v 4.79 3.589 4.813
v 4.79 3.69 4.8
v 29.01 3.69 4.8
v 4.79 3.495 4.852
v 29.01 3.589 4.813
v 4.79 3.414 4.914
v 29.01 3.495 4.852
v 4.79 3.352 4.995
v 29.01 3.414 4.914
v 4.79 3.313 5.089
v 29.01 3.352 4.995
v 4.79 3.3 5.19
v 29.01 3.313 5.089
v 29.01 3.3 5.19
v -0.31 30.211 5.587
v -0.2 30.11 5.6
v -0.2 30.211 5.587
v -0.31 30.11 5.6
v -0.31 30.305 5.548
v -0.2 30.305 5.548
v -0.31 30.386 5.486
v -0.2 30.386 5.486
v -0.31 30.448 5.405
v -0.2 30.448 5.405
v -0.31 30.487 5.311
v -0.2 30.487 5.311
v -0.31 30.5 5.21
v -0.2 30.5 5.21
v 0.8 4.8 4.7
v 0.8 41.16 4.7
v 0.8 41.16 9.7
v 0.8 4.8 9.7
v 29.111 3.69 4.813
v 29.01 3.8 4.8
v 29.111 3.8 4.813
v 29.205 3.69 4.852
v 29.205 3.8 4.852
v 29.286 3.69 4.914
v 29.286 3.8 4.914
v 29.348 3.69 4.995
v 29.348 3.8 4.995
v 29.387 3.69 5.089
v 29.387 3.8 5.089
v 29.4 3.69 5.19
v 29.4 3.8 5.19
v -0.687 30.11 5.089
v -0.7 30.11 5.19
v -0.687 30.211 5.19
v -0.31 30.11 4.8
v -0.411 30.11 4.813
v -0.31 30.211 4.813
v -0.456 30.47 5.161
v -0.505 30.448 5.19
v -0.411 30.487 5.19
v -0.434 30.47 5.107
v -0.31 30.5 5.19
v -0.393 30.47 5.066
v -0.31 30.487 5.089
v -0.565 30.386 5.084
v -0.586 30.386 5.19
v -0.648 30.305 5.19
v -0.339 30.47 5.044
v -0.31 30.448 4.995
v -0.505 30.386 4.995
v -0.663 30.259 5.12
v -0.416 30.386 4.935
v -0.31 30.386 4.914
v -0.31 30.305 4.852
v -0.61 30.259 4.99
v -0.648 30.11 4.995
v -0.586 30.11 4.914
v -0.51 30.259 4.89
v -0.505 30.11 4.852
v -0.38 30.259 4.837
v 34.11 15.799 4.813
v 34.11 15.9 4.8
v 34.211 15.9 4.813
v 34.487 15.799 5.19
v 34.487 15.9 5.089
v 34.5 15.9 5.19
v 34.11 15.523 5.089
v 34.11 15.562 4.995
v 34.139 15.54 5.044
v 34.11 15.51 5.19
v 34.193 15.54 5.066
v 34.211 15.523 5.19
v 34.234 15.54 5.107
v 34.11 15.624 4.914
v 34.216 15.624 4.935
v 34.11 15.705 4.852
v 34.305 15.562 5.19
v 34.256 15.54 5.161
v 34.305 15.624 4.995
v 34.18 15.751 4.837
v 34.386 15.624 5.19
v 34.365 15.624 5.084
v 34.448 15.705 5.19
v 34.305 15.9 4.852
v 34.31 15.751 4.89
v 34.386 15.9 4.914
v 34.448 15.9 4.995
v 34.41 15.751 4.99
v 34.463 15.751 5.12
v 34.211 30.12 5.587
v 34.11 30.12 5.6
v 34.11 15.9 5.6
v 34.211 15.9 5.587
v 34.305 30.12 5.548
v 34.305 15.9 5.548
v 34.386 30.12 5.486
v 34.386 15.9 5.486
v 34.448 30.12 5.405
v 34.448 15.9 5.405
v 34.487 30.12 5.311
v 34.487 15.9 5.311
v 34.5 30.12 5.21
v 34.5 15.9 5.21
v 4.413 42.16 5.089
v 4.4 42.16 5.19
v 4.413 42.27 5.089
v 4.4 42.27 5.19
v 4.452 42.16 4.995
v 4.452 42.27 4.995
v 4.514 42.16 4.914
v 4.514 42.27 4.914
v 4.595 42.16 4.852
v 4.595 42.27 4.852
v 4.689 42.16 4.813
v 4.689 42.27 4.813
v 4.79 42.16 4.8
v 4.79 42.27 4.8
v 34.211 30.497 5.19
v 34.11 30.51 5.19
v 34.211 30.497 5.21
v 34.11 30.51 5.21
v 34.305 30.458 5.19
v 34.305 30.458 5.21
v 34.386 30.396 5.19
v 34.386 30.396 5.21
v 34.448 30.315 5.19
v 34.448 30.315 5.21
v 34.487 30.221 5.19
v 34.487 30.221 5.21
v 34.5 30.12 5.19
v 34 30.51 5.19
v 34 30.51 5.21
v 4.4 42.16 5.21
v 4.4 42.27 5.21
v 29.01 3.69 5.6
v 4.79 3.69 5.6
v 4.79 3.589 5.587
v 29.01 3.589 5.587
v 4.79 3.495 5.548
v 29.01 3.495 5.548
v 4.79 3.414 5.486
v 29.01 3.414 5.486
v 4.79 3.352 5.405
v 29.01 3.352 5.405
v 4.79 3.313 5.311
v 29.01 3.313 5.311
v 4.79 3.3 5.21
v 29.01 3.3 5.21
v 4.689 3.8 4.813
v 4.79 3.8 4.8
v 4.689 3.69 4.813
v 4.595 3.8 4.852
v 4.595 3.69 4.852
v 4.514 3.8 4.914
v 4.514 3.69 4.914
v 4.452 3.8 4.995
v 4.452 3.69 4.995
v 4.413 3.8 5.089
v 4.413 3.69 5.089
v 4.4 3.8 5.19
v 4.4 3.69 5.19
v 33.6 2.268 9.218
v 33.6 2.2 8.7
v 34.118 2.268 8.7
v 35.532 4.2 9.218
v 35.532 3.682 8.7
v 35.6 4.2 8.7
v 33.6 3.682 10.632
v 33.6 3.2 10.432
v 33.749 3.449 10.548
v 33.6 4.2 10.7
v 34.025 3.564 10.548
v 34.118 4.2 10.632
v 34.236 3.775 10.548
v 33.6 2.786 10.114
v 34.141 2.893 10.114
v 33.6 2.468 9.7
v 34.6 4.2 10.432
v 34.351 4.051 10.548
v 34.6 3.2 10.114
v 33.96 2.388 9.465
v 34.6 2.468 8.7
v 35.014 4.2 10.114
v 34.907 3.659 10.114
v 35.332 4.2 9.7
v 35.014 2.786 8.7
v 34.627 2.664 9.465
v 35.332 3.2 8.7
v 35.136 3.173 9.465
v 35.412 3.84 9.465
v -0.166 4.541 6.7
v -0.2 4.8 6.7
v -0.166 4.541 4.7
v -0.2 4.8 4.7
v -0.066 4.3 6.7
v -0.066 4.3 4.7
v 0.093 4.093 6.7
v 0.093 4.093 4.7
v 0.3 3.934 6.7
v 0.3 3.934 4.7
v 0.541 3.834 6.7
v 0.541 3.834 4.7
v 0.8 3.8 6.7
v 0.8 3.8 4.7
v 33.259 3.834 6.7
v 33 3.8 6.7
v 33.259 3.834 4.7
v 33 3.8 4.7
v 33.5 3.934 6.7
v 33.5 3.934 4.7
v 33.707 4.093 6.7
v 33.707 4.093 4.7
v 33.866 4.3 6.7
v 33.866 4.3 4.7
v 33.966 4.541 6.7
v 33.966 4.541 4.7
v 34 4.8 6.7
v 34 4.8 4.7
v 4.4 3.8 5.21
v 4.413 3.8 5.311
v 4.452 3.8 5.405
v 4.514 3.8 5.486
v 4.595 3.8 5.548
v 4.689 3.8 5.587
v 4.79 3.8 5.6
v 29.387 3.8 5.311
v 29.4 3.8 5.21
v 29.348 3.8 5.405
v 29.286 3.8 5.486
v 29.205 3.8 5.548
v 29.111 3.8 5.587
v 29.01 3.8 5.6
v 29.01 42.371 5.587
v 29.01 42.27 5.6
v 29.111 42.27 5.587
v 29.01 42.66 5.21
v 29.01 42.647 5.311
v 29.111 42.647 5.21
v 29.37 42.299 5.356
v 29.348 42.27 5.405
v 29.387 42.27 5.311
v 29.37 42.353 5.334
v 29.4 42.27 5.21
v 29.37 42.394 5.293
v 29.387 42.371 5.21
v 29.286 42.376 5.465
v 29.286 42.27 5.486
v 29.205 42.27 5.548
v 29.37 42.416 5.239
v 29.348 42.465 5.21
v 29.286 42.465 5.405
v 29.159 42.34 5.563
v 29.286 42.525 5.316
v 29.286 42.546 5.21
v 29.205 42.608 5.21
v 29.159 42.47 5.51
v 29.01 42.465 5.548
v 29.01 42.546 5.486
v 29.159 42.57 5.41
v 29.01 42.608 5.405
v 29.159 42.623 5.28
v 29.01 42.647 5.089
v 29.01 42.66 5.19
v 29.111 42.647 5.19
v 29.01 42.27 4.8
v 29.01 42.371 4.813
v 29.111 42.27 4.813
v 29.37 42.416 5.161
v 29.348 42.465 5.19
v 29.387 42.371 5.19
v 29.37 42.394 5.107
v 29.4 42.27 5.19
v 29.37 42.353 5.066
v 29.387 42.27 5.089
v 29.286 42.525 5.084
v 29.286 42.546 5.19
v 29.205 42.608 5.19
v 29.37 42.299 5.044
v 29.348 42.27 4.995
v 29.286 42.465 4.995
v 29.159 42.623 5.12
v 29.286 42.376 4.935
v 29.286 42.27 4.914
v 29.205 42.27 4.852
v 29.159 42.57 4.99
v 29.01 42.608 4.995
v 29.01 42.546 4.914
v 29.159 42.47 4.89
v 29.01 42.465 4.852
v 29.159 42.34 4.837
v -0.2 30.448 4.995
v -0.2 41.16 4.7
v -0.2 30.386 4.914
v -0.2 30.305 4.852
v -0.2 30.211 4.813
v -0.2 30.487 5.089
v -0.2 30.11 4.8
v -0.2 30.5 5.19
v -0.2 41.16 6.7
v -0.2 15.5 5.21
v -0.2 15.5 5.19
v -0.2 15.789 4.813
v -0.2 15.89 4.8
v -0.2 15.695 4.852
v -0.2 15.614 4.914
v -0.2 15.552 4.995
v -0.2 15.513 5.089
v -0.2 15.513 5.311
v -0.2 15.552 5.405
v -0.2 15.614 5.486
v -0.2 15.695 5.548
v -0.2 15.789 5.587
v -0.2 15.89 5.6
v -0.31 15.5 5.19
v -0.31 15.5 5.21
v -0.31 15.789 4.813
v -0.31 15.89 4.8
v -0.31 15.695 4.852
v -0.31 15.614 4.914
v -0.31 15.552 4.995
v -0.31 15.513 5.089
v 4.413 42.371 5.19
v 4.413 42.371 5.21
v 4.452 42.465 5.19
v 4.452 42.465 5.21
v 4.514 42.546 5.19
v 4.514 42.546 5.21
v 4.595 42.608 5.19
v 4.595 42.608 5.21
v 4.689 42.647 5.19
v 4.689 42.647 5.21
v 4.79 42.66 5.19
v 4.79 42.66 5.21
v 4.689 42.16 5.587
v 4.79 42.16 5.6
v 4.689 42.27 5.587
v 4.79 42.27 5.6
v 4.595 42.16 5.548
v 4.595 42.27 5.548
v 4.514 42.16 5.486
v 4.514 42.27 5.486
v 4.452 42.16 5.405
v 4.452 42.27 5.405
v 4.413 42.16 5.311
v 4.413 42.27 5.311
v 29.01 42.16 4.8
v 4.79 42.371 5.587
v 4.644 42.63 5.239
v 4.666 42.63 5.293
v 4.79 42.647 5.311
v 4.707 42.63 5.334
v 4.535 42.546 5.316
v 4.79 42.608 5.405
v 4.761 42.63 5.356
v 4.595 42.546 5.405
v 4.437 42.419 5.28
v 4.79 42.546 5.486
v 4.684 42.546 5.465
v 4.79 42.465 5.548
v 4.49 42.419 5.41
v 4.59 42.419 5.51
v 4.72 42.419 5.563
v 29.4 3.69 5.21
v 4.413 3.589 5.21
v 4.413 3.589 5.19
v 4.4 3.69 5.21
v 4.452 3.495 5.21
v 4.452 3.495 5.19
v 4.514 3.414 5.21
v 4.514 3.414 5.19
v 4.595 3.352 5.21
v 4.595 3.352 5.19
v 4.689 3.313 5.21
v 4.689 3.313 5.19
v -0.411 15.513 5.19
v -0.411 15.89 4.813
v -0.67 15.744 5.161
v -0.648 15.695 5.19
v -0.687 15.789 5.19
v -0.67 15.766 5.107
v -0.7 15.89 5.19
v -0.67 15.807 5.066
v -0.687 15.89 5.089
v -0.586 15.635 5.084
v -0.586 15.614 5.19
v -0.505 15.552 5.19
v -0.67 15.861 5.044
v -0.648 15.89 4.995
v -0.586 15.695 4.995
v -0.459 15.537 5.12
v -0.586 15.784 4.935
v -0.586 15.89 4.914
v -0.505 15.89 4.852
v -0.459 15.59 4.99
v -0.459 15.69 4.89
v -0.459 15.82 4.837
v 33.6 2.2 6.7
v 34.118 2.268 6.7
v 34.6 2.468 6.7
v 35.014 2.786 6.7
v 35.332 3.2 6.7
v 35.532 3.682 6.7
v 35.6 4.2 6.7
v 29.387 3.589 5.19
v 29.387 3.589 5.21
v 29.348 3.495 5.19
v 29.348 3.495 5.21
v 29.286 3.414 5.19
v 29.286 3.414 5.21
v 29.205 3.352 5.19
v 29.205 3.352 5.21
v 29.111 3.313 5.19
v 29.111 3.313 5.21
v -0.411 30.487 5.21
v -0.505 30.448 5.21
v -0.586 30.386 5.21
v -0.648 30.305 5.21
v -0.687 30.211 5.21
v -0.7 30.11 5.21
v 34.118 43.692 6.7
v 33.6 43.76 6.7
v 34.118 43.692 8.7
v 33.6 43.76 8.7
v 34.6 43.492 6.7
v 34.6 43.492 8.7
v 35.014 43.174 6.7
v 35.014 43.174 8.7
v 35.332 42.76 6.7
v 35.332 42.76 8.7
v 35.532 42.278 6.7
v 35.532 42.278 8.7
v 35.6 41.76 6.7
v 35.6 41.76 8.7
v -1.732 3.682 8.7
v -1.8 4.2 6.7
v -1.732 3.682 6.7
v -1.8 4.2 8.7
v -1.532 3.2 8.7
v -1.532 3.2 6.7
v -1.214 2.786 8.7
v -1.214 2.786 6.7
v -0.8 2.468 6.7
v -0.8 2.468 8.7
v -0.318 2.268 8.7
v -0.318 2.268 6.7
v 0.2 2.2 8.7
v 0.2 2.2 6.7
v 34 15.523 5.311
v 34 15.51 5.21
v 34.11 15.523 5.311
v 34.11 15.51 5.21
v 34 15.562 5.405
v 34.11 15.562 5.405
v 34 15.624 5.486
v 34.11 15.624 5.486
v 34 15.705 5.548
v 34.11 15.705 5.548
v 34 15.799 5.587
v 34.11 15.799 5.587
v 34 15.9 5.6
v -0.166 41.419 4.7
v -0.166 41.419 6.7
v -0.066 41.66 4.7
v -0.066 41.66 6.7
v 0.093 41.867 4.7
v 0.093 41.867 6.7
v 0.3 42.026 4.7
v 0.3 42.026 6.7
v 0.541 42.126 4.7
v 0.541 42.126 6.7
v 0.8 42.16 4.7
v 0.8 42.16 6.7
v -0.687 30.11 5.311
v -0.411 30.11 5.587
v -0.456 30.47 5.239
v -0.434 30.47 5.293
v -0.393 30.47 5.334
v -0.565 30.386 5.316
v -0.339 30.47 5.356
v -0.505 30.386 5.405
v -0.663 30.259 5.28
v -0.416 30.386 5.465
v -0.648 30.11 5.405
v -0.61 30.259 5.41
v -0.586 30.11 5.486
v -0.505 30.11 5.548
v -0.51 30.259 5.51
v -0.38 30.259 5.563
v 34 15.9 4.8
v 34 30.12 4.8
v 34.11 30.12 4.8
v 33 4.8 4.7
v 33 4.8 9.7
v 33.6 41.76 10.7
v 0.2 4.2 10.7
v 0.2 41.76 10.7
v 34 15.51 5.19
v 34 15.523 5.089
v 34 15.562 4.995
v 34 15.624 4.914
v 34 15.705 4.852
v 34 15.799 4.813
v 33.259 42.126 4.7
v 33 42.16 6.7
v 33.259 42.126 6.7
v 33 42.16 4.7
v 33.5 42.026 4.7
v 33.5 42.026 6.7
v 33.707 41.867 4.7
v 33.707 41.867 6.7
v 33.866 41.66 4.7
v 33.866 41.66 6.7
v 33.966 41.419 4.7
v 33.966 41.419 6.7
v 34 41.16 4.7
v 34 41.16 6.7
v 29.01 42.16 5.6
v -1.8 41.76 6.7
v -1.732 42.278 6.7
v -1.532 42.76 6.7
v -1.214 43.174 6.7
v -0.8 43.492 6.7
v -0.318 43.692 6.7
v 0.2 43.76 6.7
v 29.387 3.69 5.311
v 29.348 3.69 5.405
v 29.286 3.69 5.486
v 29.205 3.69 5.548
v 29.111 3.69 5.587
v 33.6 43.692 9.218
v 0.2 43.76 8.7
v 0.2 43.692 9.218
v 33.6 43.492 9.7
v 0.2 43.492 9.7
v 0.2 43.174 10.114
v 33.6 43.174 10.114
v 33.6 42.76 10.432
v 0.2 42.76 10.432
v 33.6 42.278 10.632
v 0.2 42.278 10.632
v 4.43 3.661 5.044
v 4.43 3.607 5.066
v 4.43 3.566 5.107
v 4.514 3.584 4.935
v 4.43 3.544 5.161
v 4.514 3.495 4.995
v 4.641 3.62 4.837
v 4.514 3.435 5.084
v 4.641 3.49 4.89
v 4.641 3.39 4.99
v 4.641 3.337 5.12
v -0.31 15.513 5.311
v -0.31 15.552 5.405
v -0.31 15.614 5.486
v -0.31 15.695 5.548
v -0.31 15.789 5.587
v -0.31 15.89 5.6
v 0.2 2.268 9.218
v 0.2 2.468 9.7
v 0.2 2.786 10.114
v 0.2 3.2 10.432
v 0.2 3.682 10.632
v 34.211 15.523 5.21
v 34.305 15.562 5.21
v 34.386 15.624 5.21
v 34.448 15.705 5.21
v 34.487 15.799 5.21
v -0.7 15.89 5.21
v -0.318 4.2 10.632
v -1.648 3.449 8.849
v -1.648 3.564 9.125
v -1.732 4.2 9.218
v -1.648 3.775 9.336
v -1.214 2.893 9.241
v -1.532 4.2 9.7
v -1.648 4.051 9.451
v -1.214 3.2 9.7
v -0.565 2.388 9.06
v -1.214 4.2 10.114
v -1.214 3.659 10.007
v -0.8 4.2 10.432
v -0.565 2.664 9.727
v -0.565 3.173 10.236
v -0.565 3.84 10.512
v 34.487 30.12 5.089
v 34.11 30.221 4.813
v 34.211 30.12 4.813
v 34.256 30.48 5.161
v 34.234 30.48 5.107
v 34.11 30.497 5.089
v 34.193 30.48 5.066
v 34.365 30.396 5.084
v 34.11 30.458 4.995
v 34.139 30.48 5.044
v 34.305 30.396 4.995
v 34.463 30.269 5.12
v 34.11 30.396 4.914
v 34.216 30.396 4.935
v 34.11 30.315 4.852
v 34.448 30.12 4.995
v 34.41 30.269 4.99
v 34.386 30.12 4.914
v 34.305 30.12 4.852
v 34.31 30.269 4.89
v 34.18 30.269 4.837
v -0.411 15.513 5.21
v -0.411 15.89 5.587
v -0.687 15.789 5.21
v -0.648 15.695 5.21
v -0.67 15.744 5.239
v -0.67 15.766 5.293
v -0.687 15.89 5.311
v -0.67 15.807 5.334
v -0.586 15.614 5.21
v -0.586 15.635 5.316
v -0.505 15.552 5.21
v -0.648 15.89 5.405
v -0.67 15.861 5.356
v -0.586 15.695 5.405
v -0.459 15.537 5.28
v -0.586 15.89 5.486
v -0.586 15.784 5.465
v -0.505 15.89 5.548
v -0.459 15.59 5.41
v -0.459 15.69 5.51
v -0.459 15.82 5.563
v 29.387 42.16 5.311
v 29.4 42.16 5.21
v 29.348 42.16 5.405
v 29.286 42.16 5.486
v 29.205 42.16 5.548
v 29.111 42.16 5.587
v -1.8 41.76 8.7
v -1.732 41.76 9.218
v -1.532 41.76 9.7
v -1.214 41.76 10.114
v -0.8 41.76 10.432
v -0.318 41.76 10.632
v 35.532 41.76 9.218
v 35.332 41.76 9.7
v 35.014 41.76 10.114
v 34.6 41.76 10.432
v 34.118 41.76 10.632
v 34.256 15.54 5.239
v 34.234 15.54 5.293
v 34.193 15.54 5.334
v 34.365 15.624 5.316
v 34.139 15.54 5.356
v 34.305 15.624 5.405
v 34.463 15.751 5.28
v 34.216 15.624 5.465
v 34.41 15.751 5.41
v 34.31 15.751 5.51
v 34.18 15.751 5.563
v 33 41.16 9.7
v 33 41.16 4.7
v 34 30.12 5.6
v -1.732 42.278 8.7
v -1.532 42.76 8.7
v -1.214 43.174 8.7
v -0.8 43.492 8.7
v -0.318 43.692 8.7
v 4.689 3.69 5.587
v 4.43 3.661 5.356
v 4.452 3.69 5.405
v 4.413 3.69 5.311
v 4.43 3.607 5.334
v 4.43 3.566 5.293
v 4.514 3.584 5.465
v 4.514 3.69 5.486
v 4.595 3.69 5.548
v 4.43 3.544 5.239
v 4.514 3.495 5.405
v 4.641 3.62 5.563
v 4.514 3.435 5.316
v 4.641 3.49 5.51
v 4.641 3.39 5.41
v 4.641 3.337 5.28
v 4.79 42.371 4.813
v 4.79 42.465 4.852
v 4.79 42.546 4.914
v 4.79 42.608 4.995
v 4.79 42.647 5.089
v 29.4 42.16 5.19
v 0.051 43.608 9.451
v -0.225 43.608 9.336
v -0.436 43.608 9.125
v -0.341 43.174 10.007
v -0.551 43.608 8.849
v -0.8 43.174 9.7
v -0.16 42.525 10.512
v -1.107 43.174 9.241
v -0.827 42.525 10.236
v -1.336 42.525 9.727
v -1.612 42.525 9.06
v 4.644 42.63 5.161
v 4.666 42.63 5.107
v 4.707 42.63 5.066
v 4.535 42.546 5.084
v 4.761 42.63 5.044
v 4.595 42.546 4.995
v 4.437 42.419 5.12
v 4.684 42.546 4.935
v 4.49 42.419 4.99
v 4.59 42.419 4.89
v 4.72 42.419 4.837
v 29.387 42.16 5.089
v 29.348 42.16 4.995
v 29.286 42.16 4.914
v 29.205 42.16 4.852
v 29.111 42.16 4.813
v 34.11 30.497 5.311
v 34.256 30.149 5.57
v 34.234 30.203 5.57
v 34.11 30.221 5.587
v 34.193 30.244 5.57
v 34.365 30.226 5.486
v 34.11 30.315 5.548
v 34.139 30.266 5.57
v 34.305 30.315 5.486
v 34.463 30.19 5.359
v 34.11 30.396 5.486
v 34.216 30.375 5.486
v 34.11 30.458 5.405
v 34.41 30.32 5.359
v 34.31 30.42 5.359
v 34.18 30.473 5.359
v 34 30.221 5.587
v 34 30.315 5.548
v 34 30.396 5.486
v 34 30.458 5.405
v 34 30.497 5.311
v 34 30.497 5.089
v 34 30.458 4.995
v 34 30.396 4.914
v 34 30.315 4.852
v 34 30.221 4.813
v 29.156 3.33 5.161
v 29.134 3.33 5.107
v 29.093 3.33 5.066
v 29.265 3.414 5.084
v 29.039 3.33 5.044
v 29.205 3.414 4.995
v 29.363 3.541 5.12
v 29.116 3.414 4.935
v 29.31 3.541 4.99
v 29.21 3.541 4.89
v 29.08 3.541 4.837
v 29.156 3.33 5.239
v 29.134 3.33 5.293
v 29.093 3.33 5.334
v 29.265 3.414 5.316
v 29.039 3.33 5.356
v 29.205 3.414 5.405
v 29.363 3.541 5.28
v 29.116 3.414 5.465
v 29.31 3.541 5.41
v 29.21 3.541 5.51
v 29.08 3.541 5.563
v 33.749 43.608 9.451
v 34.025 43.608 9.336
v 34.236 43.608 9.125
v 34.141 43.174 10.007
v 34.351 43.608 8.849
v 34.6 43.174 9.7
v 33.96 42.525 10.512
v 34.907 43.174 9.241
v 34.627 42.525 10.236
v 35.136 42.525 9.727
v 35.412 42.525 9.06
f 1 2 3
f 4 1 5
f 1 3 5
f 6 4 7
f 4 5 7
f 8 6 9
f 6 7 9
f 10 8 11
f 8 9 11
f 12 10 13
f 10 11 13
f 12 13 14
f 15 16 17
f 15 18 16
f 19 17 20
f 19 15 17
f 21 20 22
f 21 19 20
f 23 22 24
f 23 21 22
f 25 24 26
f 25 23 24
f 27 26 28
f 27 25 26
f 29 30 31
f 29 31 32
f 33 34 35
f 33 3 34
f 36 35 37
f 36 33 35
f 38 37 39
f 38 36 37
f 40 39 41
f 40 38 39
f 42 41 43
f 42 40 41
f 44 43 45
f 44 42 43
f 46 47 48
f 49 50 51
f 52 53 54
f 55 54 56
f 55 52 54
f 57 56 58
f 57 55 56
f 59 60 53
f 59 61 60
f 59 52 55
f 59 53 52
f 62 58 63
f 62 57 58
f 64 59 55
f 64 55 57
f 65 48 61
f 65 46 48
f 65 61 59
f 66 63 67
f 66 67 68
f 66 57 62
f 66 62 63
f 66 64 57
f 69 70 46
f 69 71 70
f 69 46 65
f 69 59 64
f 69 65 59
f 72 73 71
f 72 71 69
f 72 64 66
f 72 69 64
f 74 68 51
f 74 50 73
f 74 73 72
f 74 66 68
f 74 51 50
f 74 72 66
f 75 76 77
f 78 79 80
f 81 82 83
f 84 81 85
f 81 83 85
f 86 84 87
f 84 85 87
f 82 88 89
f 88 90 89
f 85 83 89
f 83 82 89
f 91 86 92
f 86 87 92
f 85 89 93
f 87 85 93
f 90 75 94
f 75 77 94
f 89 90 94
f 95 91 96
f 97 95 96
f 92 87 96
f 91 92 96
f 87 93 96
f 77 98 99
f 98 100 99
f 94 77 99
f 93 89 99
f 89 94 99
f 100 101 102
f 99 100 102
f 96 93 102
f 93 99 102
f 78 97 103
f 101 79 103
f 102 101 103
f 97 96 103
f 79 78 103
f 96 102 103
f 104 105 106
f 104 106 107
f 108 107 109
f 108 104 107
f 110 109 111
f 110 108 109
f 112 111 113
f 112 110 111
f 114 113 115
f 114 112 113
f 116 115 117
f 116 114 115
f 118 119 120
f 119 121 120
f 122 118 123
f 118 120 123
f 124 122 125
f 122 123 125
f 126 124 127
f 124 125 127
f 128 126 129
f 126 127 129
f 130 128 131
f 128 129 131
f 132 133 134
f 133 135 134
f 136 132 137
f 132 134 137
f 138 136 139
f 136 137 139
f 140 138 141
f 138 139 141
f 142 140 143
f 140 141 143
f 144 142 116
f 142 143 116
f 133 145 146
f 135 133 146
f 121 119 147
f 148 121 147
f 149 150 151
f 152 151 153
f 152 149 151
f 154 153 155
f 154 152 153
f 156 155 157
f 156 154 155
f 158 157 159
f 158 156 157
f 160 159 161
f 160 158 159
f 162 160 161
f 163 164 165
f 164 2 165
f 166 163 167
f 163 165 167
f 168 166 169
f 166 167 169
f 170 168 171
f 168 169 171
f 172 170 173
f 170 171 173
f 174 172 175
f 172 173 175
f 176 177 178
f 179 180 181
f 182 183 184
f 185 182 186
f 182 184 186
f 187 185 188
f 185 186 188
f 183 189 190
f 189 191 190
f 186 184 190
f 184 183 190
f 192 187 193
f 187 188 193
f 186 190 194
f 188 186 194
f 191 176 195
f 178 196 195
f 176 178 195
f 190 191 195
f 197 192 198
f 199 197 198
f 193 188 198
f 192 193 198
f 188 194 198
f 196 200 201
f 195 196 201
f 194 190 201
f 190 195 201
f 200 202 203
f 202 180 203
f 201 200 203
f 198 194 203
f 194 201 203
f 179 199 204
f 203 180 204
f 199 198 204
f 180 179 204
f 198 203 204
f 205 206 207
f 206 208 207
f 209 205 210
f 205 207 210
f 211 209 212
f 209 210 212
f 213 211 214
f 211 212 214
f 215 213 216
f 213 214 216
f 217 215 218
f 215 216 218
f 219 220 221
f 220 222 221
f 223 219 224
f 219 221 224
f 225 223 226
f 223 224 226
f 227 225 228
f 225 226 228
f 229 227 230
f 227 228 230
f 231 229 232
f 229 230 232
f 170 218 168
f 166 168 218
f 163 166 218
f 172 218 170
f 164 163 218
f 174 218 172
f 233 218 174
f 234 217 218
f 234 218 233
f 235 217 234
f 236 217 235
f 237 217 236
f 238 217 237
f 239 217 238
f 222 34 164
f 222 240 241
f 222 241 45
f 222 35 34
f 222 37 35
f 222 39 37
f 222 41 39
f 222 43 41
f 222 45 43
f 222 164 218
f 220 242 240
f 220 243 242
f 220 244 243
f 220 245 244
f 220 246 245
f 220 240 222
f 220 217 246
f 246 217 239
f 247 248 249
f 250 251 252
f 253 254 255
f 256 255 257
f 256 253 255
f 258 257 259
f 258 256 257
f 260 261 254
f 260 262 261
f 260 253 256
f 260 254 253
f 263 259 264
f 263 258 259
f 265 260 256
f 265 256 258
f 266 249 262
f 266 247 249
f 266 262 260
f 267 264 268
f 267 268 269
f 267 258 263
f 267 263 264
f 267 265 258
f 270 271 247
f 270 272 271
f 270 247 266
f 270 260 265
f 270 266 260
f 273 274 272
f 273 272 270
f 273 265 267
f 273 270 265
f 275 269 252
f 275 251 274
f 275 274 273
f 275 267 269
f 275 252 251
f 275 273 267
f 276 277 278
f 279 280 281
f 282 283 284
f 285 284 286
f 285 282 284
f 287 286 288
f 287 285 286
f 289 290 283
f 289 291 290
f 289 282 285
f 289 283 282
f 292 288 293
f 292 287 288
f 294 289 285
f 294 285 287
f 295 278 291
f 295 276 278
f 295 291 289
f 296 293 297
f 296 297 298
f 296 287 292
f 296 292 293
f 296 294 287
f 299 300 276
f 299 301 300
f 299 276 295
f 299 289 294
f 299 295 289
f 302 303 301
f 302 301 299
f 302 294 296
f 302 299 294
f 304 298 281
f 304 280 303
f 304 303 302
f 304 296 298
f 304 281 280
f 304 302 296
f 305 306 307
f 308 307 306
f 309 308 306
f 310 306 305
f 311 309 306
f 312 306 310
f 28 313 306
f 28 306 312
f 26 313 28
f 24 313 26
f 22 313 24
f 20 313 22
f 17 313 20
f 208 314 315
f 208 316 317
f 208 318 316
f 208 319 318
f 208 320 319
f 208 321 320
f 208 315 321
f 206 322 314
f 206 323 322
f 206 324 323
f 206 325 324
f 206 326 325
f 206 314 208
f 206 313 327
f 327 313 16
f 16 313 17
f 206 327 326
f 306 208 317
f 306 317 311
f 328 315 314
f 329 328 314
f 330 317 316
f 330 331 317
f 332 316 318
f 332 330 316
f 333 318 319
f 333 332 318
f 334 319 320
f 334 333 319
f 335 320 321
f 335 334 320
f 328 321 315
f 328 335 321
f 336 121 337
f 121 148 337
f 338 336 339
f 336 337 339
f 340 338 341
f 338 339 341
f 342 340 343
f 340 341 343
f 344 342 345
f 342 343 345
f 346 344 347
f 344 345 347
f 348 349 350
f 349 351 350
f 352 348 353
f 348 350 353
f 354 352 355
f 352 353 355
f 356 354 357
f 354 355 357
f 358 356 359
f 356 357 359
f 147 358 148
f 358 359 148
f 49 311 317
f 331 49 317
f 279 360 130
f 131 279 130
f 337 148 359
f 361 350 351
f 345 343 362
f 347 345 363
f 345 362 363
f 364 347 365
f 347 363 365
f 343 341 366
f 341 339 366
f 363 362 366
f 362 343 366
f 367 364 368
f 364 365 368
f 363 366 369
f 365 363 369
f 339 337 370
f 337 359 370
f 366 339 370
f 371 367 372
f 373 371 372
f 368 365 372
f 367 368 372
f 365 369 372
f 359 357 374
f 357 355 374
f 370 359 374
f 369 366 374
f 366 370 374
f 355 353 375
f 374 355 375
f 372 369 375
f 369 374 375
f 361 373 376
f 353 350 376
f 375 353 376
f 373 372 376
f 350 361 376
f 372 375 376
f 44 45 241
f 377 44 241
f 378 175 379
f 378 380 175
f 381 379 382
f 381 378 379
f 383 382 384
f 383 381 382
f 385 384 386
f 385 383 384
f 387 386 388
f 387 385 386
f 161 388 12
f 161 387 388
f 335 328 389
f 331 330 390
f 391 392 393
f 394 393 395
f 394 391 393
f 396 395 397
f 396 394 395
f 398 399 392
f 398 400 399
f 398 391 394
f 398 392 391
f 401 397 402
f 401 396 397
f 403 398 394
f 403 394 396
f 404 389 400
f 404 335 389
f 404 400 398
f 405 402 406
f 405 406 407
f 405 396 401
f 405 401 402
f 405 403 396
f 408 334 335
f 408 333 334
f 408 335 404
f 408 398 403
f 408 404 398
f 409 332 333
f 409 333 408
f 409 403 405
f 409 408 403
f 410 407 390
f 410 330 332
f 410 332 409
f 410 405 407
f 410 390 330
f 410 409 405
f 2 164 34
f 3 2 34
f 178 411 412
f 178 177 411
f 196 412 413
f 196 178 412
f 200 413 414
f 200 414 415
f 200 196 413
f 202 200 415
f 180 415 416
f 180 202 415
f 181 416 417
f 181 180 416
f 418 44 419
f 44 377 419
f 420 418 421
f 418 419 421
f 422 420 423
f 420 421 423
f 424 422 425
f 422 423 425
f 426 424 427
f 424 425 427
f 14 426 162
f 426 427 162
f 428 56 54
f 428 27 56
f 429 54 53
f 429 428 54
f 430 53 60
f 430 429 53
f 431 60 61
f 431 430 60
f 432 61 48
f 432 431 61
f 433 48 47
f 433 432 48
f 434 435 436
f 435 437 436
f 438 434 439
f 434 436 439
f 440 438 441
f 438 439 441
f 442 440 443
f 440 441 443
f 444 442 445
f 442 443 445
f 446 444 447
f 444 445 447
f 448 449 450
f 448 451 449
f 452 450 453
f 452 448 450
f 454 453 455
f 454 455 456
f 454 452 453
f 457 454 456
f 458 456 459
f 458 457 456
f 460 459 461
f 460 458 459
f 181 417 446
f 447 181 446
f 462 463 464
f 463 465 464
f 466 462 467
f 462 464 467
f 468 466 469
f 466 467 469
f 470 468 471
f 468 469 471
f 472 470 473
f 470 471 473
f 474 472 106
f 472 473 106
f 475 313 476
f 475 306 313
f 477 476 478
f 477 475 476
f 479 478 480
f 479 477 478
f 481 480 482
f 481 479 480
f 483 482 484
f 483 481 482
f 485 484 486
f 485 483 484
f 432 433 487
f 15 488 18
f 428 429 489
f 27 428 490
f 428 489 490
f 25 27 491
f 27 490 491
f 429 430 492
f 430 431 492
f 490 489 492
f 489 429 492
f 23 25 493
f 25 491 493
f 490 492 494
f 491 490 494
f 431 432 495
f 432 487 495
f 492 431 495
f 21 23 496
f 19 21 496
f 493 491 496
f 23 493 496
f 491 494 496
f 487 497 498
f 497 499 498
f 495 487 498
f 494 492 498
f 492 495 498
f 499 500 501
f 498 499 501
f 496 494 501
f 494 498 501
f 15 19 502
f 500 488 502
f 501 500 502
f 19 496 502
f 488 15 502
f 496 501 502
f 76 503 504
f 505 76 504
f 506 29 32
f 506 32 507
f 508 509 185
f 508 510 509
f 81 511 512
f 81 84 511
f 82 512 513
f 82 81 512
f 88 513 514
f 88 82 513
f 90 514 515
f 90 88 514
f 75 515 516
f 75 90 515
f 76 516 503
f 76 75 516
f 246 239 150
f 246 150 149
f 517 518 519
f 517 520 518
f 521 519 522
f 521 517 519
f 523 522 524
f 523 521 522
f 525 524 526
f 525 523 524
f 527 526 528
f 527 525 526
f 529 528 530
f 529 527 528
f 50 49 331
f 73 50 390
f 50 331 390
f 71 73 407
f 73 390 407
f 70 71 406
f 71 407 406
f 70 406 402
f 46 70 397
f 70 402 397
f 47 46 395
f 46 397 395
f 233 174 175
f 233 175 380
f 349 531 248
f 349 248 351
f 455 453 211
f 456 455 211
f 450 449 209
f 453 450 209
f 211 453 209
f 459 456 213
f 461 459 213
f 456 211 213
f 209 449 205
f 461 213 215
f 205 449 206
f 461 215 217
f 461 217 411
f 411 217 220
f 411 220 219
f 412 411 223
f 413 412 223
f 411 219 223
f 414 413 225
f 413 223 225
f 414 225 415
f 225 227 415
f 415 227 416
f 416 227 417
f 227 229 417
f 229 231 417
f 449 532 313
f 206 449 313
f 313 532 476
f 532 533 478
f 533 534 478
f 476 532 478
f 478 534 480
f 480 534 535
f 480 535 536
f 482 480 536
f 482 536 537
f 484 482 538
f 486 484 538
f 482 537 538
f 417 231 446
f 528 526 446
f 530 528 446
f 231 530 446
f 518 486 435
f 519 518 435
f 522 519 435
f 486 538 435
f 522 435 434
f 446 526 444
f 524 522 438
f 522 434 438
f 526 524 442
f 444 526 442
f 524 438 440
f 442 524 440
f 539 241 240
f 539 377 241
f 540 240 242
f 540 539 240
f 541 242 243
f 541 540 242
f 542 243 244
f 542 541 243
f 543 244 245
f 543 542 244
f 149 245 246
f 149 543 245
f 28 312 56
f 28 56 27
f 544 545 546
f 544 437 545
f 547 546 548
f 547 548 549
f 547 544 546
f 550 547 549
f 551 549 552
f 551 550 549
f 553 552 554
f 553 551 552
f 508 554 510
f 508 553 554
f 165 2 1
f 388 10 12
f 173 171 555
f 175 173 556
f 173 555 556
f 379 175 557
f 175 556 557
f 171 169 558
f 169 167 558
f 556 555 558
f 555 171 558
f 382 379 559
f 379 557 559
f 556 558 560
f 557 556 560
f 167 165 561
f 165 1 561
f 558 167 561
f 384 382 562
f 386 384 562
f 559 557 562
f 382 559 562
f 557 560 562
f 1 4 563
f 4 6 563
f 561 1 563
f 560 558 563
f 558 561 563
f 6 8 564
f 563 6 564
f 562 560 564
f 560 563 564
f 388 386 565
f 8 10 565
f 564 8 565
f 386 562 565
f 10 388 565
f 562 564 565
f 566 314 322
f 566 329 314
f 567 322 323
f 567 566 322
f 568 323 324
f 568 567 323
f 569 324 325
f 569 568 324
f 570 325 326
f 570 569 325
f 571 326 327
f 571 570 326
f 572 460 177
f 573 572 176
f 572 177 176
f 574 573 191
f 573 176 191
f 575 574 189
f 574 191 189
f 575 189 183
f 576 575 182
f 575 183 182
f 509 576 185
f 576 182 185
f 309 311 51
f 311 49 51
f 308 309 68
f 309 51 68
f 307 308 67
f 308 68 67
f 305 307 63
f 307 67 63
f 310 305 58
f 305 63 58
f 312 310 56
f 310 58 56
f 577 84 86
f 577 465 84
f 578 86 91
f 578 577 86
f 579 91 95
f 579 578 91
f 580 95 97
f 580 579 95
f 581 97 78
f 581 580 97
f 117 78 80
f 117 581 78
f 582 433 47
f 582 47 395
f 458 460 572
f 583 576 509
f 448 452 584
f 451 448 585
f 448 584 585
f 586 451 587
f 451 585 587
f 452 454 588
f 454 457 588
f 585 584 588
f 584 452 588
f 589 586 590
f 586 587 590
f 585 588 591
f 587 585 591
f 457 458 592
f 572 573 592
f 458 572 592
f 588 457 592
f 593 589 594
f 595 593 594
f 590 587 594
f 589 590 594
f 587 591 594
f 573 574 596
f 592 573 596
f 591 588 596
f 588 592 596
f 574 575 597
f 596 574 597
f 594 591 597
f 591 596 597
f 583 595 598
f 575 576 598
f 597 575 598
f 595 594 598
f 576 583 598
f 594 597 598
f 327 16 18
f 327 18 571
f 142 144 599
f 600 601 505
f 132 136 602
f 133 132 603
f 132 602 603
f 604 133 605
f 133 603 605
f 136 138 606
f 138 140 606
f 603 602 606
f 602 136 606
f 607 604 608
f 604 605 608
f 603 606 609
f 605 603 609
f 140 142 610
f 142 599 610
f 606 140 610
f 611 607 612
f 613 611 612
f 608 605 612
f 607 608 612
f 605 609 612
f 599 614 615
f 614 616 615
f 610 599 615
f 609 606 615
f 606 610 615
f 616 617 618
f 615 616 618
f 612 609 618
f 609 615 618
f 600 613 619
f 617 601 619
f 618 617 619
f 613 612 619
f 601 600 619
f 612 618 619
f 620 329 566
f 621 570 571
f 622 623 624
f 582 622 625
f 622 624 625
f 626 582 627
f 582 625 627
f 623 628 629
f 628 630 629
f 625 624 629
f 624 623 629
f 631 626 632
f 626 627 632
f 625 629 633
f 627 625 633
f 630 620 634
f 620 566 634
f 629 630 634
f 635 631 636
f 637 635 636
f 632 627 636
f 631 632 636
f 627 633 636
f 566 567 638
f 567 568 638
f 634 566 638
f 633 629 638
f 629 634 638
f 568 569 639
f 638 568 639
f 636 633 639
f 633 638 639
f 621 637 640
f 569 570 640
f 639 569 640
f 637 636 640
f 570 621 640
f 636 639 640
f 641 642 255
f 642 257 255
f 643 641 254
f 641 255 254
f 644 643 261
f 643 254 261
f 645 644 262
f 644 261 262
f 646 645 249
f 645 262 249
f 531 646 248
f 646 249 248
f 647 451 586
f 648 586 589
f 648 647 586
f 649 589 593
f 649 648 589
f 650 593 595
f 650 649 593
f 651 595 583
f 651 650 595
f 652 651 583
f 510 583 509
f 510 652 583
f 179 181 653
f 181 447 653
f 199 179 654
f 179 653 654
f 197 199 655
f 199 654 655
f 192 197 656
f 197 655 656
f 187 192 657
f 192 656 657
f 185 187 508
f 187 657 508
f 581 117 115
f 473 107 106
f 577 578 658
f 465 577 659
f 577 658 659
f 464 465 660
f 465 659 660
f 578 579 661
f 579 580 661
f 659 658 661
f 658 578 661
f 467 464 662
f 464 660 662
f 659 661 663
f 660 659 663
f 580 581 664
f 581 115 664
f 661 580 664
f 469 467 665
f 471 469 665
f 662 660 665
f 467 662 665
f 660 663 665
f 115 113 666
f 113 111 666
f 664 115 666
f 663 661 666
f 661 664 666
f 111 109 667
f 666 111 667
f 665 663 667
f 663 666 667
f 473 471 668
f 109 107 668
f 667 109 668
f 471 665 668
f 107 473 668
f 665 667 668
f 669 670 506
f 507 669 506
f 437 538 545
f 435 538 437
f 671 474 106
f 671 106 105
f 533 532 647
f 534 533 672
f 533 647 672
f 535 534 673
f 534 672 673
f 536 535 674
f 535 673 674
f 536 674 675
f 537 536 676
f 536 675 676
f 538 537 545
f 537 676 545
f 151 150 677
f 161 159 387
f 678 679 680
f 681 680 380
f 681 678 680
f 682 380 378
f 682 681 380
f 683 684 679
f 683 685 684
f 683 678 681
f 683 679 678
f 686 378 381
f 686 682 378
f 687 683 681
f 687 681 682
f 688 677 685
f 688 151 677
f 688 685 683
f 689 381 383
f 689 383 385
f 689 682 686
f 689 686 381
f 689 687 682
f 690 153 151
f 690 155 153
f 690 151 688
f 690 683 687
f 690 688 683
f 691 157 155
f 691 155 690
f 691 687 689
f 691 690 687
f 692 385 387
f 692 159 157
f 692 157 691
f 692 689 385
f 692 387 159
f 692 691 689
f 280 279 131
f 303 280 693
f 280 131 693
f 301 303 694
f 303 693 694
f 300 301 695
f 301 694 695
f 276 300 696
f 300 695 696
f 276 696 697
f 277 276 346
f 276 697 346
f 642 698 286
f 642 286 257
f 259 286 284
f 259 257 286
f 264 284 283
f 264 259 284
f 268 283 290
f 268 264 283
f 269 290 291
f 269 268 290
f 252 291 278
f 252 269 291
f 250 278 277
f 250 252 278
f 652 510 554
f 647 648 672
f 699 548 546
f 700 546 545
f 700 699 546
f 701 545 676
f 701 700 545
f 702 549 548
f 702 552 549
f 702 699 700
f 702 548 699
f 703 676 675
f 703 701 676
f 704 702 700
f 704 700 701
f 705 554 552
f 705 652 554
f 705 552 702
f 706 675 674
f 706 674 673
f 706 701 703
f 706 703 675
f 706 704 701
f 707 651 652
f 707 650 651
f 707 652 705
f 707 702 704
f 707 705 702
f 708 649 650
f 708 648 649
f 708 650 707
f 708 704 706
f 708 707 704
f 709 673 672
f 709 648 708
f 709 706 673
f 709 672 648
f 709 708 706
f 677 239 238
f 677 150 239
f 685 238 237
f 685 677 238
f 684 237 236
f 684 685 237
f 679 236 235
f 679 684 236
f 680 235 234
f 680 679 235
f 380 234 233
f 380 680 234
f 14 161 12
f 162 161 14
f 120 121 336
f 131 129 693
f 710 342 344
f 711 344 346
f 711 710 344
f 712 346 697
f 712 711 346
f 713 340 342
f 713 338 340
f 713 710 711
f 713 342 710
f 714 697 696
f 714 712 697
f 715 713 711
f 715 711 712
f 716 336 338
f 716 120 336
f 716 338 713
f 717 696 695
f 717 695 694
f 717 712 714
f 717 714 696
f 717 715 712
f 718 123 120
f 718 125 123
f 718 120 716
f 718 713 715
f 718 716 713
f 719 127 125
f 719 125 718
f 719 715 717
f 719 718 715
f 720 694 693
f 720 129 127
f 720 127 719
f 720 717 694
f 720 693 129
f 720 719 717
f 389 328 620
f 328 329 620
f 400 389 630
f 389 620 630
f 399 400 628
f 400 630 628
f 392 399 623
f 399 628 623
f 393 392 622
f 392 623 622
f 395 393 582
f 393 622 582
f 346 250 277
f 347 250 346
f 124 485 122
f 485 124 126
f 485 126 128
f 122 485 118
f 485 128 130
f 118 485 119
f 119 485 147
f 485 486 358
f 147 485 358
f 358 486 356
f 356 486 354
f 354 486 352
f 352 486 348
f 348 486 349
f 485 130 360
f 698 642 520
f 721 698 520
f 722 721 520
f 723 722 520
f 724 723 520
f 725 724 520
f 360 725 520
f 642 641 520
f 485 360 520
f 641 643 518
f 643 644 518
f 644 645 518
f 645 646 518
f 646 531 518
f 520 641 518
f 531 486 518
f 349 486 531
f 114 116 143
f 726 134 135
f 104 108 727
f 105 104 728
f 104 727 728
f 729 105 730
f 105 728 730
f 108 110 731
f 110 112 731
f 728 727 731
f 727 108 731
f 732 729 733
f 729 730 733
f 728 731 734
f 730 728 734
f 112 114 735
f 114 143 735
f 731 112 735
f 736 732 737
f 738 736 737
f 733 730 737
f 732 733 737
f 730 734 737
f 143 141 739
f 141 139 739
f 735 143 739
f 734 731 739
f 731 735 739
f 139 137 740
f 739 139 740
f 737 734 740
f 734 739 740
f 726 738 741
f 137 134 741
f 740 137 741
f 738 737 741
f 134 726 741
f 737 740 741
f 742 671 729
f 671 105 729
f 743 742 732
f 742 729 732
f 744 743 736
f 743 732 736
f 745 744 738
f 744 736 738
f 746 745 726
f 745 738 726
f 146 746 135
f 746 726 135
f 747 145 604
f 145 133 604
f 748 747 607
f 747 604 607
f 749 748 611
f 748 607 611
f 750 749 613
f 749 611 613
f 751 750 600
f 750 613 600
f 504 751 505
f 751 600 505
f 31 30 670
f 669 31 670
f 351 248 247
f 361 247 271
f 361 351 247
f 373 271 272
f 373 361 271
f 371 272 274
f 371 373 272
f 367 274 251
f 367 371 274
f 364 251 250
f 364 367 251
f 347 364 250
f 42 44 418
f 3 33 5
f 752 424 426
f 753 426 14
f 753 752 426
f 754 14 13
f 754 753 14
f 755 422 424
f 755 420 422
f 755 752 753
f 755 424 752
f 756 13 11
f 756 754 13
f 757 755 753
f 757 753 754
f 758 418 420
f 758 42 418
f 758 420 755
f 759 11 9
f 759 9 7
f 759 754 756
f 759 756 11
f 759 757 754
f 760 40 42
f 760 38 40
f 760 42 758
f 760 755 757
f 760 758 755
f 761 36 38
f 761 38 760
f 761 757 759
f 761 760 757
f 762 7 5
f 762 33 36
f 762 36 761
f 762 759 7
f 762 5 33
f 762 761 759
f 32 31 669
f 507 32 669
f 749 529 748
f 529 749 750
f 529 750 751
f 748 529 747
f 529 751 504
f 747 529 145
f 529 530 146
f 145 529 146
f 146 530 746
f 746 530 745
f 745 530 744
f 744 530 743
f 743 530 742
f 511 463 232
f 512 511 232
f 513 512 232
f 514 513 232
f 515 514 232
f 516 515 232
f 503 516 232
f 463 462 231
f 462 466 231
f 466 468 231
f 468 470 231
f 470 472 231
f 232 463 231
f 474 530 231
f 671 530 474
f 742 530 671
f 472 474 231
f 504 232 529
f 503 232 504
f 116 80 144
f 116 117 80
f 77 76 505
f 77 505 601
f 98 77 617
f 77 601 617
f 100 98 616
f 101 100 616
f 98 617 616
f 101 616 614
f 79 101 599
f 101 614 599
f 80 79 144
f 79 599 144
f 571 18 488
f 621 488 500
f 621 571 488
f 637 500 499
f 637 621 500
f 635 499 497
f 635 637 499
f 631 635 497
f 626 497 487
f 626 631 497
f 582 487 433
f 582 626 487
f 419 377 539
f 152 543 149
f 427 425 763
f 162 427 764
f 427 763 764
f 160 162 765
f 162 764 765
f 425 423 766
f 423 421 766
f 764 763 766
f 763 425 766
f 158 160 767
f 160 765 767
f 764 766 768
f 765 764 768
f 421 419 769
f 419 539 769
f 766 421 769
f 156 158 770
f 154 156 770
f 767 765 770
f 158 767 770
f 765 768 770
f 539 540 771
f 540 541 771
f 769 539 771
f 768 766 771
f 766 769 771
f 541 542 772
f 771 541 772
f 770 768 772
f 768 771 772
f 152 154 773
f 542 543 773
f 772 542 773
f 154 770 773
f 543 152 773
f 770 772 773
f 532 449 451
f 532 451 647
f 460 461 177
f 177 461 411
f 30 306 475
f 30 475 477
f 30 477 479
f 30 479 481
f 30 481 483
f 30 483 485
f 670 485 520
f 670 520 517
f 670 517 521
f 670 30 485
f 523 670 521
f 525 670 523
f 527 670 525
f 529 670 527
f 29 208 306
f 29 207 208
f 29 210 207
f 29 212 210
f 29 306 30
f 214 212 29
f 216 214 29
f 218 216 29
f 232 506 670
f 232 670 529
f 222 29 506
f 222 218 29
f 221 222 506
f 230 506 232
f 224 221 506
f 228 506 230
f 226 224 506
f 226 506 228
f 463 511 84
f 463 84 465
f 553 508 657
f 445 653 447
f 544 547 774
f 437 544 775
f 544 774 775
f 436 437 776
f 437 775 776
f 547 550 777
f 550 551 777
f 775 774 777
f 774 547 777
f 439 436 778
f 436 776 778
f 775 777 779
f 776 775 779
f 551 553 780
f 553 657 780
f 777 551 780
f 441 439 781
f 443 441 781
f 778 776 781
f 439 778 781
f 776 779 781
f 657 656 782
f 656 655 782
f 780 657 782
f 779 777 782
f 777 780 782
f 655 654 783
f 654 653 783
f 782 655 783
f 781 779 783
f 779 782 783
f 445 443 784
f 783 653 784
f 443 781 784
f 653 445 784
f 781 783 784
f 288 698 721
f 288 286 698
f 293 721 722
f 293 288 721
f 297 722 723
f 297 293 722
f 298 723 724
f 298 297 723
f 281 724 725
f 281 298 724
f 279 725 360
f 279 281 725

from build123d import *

# Parameters (mm, degrees)
SKETCH043_W     = 37.4
SKETCH043_H     = 41.56
PAD028_DEPTH    = 4
SKETCH044_W     = 34.2
SKETCH044_H     = 38.36
PAD029_DEPTH    = 2
SKETCH045_W     = 32.2
SKETCH045_H     = 36.36
POCKET024_DEPTH = 5
SKETCH046_W     = 25
SKETCH046_H     = 0.8
PAD030_DEPTH    = 0.5
SKETCH047_W     = 15
SKETCH047_H     = 0.8
PAD033_DEPTH    = 0.5
SKETCH054_W     = 15
SKETCH054_H     = 0.8
PAD034_DEPTH    = 0.5
SKETCH055_W     = 25
SKETCH055_H     = 0.8
PAD035_DEPTH    = 0.5
FILLET019_R     = 0.39
FILLET020_R     = 1
FILLET021_R     = 2


with BuildPart() as part:
    # Sketch043 (on DatumPlane) → Pad028 (new body)
    with BuildSketch(Plane.XY.offset(6.7)):
        with Locations((16.9, 22.98)):
            Rectangle(SKETCH043_W, SKETCH043_H)
    extrude(amount=PAD028_DEPTH)

    # Sketch044 (on Face5 of Pad028) → Pad029 (join)
    with BuildSketch(Plane(origin=(0, 0, 6.7), x_dir=(1, 0, 0), z_dir=(0, 0, -1))):
        with Locations((16.9, -22.98)):
            Rectangle(SKETCH044_W, SKETCH044_H)
    extrude(amount=PAD029_DEPTH)

    # Sketch045 (on Face11 of Pad029) → Pocket024 (cut)
    with BuildSketch(Plane(origin=(0, 0, 4.7), x_dir=(1, 0, 0), z_dir=(0, 0, -1))):
        with Locations((16.9, -22.98)):
            Rectangle(SKETCH045_W, SKETCH045_H)
    extrude(amount=-POCKET024_DEPTH, mode=Mode.SUBTRACT)

    # Sketch046 (on Face9 of Pocket024) → Pad030 (join)
    with BuildSketch(Plane(origin=(0, 42.16, 6.7), x_dir=(-1, 0, 0), z_dir=(0, 1, 0))):
        with Locations((-16.9, -1.5)):
            Rectangle(SKETCH046_W, SKETCH046_H)
    extrude(amount=PAD030_DEPTH)

    # Sketch047 (on Face10 of Pad030) → Pad033 (join)
    with BuildSketch(Plane(origin=(-0.2, 0, 6.7), x_dir=(0, -1, 0), z_dir=(-1, 0, 0))):
        with Locations((-23, -1.5)):
            Rectangle(SKETCH047_W, SKETCH047_H)
    extrude(amount=PAD033_DEPTH)

    # Sketch054 (on Face8 of Pad033) → Pad034 (join)
    with BuildSketch(Plane(origin=(34, 0, 6.7), x_dir=(0, 1, 0), z_dir=(1, 0, 0))):
        with Locations((23.01, -1.5)):
            Rectangle(SKETCH054_W, SKETCH054_H)
    extrude(amount=PAD034_DEPTH)

    # Sketch055 (on Face7 of Pad034) → Pad035 (join)
    with BuildSketch(Plane(origin=(0, 3.8, 6.7), x_dir=(1, 0, 0), z_dir=(0, -1, 0))):
        with Locations((16.9, -1.5)):
            Rectangle(SKETCH055_W, SKETCH055_H)
    extrude(amount=PAD035_DEPTH)

    # Fillet019
    fillet019_edges = [part.edges().sort_by_distance(p)[0] for p in [
        (34.5, 23.01, 4.8),
        (34.5, 30.51, 5.2),
        (34.5, 23.01, 5.6),
        (34.25, 30.51, 4.8),
        (34.25, 15.51, 4.8),
        (34.5, 15.51, 5.2),
        (34.25, 15.51, 5.6),
        (34.25, 30.51, 5.6),
        (29.4, 3.55, 5.6),
        (29.4, 3.55, 4.8),
        (29.4, 3.3, 5.2),
        (16.9, 3.3, 4.8),
        (16.9, 3.3, 5.6),
        (4.4, 3.55, 5.6),
        (4.4, 3.55, 4.8),
        (4.4, 3.3, 5.2),
        (-0.45, 15.5, 5.6),
        (-0.45, 15.5, 4.8),
        (-0.7, 15.5, 5.2),
        (-0.7, 23, 4.8),
        (-0.7, 23, 5.6),
        (-0.7, 30.5, 5.2),
        (-0.45, 30.5, 5.6),
        (-0.45, 30.5, 4.8),
        (4.4, 42.41, 5.6),
        (4.4, 42.41, 4.8),
        (4.4, 42.66, 5.2),
        (16.9, 42.66, 4.8),
        (16.9, 42.66, 5.6),
        (29.4, 42.41, 5.6),
        (29.4, 42.66, 5.2),
        (29.4, 42.41, 4.8),
    ]]
    fillet(fillet019_edges, radius=FILLET019_R)

    # Fillet020
    fillet020_edges = [part.edges().sort_by_distance(p)[0] for p in [
        (-0.2, 42.16, 5.7),
        (34, 42.16, 5.7),
        (34, 3.8, 5.7),
        (-0.2, 3.8, 5.7),
    ]]
    fillet(fillet020_edges, radius=FILLET020_R)

    # Fillet021
    fillet021_edges = [part.edges().sort_by_distance(p)[0] for p in [
        (35.6, 2.2, 8.7),
        (16.9, 2.2, 10.7),
        (35.6, 22.98, 10.7),
        (-1.8, 2.2, 8.7),
        (-1.8, 22.98, 10.7),
        (16.9, 43.76, 10.7),
        (35.6, 43.76, 8.7),
        (-1.8, 43.76, 8.7),
    ]]
    fillet(fillet021_edges, radius=FILLET021_R)


solid = part.part
